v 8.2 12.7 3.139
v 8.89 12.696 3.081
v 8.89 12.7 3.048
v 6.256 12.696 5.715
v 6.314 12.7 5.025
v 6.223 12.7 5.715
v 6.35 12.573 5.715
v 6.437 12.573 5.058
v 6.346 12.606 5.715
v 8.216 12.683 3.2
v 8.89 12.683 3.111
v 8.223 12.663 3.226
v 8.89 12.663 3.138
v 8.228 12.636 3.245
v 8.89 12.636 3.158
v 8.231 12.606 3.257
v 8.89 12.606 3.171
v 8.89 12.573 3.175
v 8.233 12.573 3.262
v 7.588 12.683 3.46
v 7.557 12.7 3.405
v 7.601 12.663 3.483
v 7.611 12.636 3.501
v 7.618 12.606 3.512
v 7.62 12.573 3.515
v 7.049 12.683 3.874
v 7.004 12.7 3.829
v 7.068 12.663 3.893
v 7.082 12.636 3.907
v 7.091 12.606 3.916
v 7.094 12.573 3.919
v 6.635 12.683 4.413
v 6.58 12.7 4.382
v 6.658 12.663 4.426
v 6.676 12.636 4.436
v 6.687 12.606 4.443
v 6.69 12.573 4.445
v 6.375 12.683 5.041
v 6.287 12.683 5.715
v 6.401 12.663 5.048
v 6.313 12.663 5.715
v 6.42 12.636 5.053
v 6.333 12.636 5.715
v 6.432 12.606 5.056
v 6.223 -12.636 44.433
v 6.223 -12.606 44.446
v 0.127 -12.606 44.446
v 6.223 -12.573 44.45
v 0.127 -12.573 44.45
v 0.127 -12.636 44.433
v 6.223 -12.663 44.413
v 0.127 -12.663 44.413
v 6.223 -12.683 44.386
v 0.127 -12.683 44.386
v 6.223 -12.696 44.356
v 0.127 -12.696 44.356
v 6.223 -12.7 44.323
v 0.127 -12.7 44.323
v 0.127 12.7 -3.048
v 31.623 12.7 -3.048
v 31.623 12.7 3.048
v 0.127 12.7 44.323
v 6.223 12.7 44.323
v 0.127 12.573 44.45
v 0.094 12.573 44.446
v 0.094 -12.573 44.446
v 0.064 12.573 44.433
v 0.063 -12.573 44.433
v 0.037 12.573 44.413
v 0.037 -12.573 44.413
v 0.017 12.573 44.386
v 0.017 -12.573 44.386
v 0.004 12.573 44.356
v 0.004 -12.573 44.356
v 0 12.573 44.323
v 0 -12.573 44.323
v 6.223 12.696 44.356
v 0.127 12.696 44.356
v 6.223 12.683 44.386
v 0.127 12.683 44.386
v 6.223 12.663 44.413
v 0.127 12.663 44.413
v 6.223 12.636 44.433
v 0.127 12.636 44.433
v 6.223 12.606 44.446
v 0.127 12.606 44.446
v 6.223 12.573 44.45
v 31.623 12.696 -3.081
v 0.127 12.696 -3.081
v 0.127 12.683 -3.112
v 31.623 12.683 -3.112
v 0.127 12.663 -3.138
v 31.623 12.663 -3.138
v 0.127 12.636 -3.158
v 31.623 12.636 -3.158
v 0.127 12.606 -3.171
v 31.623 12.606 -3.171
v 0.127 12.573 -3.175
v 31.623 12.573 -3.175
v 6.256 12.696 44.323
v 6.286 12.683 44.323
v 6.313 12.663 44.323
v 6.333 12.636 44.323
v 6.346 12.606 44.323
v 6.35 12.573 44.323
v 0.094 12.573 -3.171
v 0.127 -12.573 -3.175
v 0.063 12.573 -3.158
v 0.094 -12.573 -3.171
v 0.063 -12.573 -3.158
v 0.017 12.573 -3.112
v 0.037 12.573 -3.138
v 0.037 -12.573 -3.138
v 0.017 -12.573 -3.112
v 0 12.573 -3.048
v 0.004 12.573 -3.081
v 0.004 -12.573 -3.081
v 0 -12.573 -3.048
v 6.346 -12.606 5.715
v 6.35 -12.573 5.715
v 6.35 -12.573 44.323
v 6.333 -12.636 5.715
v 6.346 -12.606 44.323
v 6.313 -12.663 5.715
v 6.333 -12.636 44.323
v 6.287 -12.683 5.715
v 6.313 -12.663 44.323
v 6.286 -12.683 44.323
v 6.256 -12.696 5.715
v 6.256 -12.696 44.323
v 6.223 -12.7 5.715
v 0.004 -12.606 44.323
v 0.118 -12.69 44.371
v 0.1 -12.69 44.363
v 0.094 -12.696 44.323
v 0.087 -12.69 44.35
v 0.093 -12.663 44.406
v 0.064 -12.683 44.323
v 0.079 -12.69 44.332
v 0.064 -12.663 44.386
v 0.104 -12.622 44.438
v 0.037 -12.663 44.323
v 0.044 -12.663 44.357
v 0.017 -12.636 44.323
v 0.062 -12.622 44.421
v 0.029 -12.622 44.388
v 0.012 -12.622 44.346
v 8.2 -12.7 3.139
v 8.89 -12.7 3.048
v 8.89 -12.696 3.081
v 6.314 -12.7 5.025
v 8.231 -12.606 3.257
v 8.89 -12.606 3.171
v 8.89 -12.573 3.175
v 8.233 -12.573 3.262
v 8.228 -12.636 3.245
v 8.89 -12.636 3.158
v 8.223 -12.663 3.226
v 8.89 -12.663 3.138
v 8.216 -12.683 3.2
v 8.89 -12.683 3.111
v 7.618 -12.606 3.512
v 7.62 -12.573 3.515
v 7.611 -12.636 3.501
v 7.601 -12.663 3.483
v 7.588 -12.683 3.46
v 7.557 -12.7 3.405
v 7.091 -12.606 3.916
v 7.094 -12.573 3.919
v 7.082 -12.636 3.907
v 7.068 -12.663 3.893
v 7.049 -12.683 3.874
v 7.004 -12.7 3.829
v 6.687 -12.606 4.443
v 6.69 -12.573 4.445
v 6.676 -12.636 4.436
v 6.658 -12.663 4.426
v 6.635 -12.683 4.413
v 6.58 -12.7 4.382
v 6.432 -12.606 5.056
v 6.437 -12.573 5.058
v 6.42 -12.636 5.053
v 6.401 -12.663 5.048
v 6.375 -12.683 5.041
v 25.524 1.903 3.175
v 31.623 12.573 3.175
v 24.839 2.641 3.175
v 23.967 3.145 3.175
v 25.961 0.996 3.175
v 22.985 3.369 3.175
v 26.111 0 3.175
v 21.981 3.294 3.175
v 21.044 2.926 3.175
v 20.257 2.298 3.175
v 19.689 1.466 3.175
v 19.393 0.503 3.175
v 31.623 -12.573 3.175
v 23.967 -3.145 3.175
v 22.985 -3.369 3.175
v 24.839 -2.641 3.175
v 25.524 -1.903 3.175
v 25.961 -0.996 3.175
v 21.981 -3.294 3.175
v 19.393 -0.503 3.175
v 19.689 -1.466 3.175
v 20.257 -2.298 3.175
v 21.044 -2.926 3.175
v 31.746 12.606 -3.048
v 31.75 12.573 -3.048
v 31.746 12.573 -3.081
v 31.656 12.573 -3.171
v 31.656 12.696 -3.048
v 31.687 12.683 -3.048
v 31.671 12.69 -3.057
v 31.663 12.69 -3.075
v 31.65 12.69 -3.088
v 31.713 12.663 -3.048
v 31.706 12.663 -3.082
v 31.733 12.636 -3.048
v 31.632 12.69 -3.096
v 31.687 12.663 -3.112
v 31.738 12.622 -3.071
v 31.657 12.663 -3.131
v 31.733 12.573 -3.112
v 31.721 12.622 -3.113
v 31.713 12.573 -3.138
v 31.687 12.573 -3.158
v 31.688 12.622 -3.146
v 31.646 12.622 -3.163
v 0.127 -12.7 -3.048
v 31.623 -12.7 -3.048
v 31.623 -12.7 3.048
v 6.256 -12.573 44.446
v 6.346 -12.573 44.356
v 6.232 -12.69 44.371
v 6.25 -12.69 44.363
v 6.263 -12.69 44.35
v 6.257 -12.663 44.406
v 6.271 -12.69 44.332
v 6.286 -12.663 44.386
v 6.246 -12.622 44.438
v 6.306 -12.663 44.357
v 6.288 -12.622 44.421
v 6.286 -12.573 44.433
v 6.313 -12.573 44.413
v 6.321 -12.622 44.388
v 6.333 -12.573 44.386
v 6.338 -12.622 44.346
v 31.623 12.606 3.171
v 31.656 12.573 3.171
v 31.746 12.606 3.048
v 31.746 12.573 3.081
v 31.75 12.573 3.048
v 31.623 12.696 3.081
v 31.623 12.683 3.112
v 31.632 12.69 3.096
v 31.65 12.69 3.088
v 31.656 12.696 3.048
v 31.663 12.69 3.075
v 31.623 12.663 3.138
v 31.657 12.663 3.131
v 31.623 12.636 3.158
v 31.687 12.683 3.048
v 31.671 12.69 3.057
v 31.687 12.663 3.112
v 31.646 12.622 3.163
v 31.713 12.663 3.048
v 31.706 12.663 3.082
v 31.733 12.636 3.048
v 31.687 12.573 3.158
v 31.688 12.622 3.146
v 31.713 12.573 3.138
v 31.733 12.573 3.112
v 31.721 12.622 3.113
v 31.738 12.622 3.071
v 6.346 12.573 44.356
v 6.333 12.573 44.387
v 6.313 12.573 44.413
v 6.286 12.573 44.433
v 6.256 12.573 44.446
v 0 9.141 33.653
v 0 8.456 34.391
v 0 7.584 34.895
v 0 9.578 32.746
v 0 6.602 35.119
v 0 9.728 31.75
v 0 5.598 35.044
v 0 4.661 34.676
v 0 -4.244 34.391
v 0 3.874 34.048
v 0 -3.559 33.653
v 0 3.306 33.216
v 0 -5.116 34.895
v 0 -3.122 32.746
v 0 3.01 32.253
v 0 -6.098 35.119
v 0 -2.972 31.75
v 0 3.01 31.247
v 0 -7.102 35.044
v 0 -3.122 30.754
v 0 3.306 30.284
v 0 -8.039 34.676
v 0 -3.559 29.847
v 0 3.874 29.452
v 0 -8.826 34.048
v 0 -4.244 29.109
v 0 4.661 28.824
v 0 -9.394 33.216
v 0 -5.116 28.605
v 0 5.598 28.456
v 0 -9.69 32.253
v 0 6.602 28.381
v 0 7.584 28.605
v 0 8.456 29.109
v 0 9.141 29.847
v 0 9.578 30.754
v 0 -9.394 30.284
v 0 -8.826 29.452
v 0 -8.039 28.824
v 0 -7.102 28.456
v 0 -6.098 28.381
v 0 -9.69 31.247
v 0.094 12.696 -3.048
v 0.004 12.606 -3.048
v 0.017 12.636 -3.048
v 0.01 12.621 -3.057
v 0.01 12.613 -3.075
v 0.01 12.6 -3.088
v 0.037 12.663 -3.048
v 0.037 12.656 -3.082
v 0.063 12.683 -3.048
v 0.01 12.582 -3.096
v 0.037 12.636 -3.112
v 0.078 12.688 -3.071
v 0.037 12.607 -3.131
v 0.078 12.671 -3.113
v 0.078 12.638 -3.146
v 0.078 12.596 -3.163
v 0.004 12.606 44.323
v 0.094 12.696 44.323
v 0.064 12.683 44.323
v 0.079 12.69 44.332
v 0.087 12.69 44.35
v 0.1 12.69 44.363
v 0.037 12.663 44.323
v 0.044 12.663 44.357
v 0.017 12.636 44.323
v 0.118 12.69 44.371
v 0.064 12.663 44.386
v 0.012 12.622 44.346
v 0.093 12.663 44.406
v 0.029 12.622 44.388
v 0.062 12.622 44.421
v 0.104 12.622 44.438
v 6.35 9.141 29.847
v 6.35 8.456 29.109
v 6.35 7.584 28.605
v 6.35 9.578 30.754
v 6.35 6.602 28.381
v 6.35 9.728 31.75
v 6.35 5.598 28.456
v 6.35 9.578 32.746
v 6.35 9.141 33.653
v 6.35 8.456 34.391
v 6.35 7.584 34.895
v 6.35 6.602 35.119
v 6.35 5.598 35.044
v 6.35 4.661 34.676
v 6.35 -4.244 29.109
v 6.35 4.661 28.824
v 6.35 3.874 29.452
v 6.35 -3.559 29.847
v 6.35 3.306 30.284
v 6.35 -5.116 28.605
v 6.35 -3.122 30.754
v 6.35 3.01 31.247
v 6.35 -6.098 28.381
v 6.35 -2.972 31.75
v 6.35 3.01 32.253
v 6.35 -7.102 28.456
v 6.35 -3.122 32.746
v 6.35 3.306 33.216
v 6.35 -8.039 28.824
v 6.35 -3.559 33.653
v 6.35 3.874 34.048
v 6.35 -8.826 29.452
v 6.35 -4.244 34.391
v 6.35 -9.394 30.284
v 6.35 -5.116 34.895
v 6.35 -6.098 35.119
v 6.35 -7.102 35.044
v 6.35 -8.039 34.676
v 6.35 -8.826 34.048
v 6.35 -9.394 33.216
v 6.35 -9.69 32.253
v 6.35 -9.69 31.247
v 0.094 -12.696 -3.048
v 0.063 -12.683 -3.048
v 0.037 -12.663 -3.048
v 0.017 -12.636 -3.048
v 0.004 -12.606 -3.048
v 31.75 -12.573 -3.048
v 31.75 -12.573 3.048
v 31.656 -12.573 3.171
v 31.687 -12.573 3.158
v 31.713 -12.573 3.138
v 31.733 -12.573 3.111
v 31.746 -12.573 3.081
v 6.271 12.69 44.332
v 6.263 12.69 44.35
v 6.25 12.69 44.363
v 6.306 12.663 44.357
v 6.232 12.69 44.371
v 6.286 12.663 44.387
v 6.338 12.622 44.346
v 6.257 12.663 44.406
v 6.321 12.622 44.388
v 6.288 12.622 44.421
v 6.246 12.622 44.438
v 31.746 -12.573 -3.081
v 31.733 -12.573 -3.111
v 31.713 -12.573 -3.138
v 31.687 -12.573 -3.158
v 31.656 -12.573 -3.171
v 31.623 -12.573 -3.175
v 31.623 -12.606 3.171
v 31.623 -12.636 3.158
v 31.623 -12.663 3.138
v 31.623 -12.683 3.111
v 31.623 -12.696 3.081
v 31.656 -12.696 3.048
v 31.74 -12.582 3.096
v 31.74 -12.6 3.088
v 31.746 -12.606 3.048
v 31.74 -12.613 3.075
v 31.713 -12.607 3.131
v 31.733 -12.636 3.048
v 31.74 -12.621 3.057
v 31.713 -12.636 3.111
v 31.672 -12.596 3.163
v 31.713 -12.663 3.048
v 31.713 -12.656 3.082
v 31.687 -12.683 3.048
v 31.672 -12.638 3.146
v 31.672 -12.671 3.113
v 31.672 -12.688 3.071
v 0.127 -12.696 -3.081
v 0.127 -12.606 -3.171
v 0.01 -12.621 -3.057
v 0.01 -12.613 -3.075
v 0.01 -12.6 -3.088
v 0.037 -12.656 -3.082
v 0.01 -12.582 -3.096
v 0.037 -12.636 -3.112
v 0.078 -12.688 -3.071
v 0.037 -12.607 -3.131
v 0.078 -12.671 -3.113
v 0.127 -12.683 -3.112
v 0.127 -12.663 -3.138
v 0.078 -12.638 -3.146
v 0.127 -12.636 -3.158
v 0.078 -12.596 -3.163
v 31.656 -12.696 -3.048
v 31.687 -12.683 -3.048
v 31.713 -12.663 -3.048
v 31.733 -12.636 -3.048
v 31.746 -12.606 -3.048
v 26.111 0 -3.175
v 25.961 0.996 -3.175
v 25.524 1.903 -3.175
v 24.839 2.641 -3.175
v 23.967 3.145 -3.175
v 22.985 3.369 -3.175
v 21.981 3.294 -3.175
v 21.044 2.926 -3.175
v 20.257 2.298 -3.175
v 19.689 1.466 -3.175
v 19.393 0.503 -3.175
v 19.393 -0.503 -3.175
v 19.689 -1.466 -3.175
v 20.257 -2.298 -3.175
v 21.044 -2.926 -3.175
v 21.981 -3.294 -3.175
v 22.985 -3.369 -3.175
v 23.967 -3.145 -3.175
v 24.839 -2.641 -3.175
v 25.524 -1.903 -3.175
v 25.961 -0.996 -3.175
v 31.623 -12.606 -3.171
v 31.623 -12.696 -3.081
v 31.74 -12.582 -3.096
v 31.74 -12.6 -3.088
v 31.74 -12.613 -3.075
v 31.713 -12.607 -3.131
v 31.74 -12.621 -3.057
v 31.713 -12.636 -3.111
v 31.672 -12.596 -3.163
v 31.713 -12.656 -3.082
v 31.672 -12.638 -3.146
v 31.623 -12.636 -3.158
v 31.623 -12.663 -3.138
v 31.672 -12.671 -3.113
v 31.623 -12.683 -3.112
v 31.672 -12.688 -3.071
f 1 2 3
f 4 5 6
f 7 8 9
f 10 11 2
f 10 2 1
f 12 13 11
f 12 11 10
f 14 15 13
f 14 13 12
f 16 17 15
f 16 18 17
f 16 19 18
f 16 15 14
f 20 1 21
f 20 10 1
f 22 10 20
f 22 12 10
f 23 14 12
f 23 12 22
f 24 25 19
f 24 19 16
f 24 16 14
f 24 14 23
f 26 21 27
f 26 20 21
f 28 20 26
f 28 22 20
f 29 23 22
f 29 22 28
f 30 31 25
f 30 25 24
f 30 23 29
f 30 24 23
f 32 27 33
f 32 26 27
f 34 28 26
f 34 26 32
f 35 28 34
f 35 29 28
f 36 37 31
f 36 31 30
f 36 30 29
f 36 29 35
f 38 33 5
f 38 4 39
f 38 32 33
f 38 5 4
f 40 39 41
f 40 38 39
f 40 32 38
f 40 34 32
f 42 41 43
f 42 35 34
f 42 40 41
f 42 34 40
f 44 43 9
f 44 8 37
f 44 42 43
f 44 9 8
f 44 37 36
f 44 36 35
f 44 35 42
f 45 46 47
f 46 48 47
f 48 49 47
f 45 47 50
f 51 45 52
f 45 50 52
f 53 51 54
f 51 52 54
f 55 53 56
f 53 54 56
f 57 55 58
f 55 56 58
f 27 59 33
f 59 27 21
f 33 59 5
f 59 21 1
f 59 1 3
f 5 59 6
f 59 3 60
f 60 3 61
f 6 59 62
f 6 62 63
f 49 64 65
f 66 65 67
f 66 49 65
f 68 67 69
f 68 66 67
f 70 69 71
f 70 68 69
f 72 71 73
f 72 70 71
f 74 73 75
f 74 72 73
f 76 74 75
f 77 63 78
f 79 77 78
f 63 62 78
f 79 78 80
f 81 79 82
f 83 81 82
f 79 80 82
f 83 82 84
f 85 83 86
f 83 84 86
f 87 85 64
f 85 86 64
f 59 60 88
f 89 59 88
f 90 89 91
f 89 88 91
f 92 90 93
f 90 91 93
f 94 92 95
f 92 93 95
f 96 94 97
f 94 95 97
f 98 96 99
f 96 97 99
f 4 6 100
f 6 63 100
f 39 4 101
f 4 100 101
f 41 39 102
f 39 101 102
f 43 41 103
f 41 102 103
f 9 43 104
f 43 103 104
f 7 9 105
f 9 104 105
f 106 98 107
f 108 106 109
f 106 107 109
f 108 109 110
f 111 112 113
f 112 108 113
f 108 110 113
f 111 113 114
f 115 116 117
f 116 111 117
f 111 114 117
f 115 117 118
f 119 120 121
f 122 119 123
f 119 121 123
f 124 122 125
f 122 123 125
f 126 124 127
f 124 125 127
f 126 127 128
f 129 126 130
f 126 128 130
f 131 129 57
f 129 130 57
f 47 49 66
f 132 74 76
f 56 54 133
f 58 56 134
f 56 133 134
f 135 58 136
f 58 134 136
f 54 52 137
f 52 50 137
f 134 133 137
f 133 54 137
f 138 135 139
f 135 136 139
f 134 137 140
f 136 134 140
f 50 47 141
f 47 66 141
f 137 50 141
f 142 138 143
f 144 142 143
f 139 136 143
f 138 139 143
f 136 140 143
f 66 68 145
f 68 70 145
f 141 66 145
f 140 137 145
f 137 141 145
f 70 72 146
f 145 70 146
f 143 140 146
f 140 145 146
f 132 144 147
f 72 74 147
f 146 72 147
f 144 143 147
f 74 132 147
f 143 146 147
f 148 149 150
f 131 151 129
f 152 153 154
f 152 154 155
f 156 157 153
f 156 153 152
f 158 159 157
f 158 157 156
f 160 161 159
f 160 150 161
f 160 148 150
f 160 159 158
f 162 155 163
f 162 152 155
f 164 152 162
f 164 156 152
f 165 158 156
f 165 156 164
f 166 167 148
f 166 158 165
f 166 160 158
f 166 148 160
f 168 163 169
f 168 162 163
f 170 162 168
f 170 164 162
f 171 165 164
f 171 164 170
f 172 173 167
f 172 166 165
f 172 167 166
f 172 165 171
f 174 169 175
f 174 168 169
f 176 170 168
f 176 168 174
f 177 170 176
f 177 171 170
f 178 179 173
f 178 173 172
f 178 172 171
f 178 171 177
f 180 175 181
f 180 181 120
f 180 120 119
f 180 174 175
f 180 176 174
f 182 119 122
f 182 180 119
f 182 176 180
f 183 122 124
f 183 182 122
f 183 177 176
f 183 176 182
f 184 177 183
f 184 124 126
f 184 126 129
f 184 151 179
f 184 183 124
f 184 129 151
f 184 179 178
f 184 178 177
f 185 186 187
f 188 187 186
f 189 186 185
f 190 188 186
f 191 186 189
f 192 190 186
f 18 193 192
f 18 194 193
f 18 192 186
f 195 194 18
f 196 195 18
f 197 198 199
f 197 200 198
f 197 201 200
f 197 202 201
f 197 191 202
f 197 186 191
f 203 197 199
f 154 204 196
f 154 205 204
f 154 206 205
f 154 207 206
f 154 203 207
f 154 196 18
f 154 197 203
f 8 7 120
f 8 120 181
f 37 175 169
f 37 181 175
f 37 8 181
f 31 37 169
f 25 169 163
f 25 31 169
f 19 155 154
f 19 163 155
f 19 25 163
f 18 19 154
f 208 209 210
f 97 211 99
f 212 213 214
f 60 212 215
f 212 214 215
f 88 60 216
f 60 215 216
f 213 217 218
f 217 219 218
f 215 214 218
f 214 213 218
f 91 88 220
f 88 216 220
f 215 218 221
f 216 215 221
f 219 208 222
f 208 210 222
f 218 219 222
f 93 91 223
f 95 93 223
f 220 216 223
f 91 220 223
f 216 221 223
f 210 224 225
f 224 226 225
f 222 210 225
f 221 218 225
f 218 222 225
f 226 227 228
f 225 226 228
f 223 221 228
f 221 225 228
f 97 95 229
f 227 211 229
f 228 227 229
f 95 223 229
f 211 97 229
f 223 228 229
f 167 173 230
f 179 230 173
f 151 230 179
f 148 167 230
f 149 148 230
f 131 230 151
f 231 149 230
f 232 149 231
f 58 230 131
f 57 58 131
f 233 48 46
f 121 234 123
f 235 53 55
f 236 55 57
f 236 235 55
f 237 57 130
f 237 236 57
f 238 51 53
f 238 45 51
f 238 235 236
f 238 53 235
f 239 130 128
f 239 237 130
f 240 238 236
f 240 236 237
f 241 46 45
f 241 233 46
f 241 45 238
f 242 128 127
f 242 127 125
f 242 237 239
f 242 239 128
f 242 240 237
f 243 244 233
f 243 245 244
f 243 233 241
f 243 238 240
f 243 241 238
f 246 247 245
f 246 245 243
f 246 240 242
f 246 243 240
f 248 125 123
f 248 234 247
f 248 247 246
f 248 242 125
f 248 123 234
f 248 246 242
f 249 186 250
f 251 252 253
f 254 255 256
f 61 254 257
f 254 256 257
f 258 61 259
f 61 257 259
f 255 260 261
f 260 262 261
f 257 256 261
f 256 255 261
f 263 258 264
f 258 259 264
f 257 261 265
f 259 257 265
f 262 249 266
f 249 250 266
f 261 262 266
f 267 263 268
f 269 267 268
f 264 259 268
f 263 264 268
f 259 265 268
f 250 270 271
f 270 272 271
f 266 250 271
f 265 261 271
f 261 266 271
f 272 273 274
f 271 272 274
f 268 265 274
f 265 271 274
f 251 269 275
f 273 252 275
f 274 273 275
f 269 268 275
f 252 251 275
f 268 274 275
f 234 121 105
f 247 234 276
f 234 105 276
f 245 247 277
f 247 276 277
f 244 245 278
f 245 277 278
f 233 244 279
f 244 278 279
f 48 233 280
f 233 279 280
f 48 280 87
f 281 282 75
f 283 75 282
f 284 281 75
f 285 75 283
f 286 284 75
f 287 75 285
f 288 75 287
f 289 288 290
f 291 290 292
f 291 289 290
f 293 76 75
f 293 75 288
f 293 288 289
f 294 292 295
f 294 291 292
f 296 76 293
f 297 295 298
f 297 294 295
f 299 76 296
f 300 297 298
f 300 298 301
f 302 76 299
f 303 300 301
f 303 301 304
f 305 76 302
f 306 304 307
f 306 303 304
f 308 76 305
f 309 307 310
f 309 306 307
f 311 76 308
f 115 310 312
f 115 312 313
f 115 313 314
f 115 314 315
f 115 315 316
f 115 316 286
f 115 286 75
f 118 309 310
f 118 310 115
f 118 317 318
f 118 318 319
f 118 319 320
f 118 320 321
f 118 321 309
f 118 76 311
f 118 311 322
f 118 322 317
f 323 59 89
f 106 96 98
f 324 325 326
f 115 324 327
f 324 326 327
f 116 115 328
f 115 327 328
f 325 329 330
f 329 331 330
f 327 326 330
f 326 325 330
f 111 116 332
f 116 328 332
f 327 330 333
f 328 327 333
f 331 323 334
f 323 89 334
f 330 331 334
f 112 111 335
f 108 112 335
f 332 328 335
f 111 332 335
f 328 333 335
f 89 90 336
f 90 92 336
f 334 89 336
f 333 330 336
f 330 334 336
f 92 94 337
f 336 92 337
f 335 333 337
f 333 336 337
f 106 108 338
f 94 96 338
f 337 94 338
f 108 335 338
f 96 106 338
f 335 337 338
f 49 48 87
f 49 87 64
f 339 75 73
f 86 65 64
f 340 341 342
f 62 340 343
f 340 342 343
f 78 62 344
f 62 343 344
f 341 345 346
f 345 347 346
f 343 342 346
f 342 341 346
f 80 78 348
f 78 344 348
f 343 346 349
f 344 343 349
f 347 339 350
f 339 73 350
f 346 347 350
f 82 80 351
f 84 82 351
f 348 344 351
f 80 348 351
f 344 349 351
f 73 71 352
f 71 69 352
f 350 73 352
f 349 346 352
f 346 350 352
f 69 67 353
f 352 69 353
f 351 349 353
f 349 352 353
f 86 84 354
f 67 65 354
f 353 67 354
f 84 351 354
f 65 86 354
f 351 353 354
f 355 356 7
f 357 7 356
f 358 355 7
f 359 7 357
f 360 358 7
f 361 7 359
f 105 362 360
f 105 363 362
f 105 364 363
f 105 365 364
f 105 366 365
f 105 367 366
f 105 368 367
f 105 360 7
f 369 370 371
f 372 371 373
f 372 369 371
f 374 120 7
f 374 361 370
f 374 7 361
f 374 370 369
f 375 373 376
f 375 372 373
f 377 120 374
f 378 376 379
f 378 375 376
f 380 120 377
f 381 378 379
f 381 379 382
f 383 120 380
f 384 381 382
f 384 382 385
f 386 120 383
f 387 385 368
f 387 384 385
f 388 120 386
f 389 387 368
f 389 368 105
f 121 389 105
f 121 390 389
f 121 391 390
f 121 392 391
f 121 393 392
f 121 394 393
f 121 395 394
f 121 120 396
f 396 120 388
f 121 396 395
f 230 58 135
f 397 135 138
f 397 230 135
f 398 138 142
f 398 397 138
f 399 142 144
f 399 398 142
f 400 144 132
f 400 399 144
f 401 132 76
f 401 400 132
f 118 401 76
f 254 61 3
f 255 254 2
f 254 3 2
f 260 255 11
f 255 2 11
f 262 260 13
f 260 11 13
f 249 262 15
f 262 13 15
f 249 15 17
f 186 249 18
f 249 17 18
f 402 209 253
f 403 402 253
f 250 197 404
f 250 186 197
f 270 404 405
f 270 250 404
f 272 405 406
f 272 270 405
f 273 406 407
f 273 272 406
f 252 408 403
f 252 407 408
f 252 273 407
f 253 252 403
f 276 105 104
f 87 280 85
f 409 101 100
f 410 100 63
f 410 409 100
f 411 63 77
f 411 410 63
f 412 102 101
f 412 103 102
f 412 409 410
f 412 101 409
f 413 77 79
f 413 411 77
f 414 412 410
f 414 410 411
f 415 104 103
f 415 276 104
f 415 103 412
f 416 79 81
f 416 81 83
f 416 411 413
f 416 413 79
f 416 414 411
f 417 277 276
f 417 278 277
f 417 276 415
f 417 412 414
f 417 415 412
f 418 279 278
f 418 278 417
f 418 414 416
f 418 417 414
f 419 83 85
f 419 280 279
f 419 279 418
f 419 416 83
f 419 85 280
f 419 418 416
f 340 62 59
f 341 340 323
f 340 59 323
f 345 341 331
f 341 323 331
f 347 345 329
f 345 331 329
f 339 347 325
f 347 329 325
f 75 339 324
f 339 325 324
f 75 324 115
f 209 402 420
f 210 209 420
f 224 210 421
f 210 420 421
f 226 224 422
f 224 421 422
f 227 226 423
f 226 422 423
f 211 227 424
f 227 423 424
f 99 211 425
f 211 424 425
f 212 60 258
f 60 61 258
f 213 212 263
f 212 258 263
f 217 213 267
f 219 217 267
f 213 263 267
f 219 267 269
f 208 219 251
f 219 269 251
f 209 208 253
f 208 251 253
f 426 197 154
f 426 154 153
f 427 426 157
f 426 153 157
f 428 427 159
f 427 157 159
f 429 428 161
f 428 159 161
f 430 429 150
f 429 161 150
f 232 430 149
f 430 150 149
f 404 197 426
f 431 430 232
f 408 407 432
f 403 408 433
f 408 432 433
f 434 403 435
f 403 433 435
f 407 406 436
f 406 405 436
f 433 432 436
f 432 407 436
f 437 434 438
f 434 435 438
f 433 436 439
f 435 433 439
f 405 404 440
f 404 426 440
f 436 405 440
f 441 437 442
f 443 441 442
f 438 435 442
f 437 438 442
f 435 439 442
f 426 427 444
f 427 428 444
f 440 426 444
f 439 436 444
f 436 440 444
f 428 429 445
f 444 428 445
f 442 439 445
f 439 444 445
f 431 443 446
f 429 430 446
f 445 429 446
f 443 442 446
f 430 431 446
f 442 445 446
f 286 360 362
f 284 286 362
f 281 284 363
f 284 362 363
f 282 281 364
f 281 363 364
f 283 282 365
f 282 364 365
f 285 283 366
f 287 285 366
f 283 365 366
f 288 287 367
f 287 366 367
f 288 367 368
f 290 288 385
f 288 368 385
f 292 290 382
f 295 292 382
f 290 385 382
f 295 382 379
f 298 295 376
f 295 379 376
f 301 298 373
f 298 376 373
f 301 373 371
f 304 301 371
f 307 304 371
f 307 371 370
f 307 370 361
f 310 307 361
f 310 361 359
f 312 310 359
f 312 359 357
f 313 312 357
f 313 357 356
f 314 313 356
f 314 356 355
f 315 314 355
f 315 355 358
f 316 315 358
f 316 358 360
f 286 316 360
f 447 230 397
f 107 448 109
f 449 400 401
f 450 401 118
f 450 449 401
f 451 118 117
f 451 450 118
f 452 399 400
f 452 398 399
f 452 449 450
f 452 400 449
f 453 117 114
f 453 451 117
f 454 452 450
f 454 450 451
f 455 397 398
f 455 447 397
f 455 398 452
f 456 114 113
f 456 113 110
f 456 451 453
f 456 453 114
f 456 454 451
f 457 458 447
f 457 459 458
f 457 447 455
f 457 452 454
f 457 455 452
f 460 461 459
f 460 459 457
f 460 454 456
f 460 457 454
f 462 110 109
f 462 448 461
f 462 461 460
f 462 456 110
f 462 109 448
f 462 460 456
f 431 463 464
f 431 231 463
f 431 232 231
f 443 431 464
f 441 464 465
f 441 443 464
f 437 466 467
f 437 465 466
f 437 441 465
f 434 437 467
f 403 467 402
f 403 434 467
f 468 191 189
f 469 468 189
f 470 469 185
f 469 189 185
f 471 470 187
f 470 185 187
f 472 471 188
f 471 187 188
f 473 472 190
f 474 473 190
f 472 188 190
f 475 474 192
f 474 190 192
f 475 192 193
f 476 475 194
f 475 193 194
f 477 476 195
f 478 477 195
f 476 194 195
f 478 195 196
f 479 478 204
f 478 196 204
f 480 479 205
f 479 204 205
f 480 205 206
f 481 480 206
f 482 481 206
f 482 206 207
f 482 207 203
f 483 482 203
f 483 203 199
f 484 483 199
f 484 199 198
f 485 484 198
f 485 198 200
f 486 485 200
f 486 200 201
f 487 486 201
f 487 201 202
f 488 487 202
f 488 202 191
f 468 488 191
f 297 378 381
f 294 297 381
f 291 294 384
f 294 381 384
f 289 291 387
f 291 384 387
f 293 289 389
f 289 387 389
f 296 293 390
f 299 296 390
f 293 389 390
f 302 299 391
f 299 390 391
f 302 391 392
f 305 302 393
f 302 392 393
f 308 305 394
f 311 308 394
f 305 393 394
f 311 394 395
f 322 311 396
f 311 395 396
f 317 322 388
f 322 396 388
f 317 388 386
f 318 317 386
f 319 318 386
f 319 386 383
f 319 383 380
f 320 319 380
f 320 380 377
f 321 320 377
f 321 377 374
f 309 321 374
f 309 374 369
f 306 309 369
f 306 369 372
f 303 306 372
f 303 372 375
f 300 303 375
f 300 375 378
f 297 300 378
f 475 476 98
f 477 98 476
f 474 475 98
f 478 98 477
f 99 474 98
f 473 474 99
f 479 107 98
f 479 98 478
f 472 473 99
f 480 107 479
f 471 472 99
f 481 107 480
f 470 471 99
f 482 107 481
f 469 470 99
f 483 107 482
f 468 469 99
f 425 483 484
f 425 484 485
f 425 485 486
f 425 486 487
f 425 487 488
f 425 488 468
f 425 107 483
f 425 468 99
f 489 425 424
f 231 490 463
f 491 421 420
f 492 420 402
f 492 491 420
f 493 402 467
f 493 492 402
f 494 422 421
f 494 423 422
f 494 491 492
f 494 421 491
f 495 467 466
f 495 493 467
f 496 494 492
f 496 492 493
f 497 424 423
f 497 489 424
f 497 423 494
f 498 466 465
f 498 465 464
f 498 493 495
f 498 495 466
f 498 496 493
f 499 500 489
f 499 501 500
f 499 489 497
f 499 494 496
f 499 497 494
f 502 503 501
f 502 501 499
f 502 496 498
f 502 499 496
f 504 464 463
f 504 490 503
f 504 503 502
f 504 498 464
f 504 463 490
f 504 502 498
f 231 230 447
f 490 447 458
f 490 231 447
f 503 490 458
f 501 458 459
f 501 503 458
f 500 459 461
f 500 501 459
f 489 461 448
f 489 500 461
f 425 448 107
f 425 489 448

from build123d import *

# Parameters (mm, degrees)
F1_DEPTH = 12.7
F2_R     = 2.54
F3_R     = 0.127
F4_R     = 3.3782
F5_DEPTH = 6.351
F6_R     = 3.3782
F7_DEPTH = 6.351


with BuildPart() as f1:
    # F0 (on Front) → F1 (new body, symmetric)
    with BuildSketch(Plane.XZ):
        Polygon((6.35, 44.45), (0, 44.45), (0, 3.175), (0, 0), (0, -3.175), (31.75, -3.175), (31.75, 3.175), (6.35, 3.175), align=None)
    extrude(amount=F1_DEPTH, both=True)

    # F2
    f2_edges = [f1.edges().sort_by_distance(p)[0] for p in [
        (6.35, 0, 3.175),
    ]]
    fillet(f2_edges, radius=F2_R)

    # F3
    f3_edges = [f1.edges().sort_by_distance(p)[0] for p in [
        (6.35, 0, 44.45),
        (0, 0, 44.45),
        (3.175, -12.7, 44.45),
        (6.35, -12.7, 25.0825),
        (20.32, -12.7, 3.175),
        (15.875, -12.7, -3.175),
        (0, -12.7, 20.6375),
        (31.75, 0, 3.175),
        (31.75, 0, -3.175),
        (20.32, 12.7, 3.175),
        (31.75, 12.7, 0),
        (15.875, 12.7, -3.175),
        (0, 12.7, 20.6375),
        (6.35, 12.7, 25.0825),
        (0, 0, -3.175),
        (31.75, -12.7, 0),
        (3.175, 12.7, 44.45),
    ]]
    fillet(f3_edges, radius=F3_R)

    # F4 (on face) → F5 (cut, through all)
    with BuildSketch(Plane.YZ.offset(6.35)):
        with Locations((-6.35, 31.75)):
            Circle(F4_R)
        with Locations((6.35, 31.75)):
            Circle(F4_R)
    extrude(amount=-F5_DEPTH, mode=Mode.SUBTRACT)

    # F6 (on face) → F7 (cut, through all)
    with BuildSketch(Plane.XY.offset(3.175)):
        with Locations((22.733, 0)):
            Circle(F6_R)
    extrude(amount=-F7_DEPTH, mode=Mode.SUBTRACT)


solid = f1.part
